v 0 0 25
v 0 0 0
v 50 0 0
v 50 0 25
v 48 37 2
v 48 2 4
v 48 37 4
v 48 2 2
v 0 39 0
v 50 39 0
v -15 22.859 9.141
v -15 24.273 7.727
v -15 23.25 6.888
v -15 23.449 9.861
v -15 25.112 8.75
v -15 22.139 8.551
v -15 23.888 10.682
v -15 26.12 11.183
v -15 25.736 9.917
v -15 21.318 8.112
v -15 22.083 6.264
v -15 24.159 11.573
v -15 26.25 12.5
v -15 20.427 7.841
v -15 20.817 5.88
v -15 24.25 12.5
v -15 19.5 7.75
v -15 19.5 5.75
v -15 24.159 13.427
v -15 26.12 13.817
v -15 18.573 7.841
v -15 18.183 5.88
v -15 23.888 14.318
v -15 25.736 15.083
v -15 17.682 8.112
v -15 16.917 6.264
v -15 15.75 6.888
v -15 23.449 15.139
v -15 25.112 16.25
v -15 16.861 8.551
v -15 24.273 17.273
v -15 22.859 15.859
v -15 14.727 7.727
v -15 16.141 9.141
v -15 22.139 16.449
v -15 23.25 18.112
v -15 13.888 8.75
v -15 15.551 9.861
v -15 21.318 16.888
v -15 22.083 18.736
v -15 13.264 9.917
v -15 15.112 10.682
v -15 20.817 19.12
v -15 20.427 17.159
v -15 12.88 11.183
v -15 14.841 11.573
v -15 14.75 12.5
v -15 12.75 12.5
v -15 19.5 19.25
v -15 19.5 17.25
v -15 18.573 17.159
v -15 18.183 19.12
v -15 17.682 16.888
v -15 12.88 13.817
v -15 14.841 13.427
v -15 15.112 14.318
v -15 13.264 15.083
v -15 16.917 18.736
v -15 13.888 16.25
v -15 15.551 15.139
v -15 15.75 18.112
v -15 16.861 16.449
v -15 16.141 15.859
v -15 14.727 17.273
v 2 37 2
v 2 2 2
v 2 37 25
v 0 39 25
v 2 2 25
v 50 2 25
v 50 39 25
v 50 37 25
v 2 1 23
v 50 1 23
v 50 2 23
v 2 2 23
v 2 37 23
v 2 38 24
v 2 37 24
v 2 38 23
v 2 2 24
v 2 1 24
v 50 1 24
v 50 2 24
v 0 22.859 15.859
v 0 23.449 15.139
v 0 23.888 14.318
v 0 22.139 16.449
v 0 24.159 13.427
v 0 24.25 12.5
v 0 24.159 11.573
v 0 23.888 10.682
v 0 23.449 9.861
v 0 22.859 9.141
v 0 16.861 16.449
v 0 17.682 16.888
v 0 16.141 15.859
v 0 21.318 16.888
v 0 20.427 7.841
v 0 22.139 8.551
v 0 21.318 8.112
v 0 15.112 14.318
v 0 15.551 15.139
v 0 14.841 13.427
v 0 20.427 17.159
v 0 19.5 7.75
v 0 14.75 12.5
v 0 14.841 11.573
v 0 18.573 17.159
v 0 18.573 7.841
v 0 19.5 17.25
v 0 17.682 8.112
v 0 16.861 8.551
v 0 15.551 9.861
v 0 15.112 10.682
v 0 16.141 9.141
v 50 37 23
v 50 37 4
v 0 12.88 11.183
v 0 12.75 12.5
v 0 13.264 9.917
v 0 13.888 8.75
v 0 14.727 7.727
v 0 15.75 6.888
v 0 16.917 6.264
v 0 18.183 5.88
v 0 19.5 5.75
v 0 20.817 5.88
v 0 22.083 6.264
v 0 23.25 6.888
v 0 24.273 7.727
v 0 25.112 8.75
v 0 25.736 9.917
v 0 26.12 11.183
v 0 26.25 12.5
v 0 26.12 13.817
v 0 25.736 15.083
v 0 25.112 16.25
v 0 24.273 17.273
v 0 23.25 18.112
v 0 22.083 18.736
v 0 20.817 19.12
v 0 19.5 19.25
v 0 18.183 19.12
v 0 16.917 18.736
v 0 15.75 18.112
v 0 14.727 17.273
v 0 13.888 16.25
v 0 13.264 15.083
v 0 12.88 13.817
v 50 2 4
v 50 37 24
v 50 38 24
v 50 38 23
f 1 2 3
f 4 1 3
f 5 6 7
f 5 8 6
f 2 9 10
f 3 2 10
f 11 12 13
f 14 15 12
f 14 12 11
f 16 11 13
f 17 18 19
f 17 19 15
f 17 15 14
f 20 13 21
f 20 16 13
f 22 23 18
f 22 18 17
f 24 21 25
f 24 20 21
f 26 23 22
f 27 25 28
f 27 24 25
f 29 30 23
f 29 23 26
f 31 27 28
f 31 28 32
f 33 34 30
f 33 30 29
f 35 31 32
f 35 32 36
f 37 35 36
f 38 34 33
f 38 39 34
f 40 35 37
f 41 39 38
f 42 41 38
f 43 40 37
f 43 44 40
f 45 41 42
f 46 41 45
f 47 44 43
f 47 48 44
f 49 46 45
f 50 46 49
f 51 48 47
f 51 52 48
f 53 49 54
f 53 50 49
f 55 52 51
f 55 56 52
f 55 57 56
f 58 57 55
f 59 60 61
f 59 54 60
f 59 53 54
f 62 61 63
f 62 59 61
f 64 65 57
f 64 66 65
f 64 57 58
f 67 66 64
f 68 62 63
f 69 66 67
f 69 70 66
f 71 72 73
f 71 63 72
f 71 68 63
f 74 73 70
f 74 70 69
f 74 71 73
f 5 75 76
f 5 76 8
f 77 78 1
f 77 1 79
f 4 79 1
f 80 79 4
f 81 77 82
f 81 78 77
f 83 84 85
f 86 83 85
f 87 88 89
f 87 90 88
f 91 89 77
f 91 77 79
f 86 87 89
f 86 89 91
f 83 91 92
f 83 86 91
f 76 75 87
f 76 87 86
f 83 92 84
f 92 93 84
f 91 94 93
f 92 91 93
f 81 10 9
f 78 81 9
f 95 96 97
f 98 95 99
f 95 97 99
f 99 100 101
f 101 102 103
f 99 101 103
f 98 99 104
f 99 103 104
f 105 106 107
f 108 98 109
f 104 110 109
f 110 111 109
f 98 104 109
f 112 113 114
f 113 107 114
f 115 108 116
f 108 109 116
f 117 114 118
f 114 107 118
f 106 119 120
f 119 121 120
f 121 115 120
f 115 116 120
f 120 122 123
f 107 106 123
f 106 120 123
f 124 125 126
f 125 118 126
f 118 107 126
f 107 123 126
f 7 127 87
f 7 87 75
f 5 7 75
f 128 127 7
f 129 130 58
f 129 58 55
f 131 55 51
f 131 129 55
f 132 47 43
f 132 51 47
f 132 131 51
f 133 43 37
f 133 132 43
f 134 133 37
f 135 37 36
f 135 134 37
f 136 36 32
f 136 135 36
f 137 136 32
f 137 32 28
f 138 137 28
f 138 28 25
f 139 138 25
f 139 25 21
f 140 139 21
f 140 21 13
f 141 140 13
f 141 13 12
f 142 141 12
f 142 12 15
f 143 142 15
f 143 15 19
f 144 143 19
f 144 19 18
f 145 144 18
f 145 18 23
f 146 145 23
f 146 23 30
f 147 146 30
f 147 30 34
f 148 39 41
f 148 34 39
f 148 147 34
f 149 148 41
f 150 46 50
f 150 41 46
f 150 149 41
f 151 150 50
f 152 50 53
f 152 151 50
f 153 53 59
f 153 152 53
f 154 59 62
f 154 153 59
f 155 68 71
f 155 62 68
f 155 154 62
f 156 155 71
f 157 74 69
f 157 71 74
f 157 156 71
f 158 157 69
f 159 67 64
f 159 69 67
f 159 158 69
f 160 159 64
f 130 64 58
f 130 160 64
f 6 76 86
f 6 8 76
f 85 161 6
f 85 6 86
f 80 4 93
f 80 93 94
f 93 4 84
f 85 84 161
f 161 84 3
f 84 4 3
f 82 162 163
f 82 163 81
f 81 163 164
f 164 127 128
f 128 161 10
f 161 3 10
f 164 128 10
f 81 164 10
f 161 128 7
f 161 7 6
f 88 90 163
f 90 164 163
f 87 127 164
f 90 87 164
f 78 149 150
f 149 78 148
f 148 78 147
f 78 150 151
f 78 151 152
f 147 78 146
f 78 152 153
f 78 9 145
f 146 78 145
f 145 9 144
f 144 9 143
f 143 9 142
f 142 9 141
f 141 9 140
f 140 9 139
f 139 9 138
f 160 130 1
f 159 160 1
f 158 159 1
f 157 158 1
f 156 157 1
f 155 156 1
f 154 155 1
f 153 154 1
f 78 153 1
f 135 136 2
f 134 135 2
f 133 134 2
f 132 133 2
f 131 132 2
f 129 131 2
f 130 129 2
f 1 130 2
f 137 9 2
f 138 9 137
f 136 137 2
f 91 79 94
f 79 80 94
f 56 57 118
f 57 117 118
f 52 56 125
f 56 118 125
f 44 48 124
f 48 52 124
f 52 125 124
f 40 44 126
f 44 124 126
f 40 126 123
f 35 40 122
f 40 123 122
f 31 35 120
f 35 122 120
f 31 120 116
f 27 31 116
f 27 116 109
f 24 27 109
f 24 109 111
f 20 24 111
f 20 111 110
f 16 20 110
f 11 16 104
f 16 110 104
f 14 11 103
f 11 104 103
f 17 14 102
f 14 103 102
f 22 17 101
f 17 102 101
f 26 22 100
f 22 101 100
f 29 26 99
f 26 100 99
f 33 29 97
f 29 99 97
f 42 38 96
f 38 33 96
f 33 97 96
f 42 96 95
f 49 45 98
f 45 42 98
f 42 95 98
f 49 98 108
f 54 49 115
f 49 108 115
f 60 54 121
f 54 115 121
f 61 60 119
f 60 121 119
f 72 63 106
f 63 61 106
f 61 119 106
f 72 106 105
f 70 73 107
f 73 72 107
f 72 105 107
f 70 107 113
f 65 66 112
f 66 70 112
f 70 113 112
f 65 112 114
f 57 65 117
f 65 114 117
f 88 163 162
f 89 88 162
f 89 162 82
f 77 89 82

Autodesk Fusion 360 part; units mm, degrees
sketch "Sketch1" plane through (0, 0, 0) normal (0, 0, 1) x (1, 0, 0)
  line L0 (0, 0) -> (50, 0)
  line L1 (50, 0) -> (50, 39)
  line L2 (50, 39) -> (0, 39)
  line L3 (0, 39) -> (0, 0)
  line L4 (2, 2) -> (48, 2)
  line L5 (48, 2) -> (48, 37)
  line L6 (48, 37) -> (2, 37)
  line L7 (2, 37) -> (2, 2)
  dimension "d1" = 46
  dimension "d2" = 2
  dimension "d3" = 2
  dimension "d4" = 2
  dimension "d5" = 2
  dimension "d6" = 35
extrude "Extrude1" add sketch "Sketch1" along normal blind 2 contours L4 L5 L6 L7
extrude "Extrude2" add sketch "Sketch1" along normal blind 25
sketch "Sketch2" plane through (50, 0, 0) normal (1, 0, 0) x (0, 1, 0)
  line L0 (0, 0) -> (39, 0)
  line L1 (39, 0) -> (39, 25)
  line L2 (39, 25) -> (0, 25)
  line L3 (0, 25) -> (0, 0)
  line L4 (2, 25) -> (2, 24)
  line L5 (2, 24) -> (1, 24)
  line L6 (1, 24) -> (1, 23)
  line L7 (1, 23) -> (38, 23)
  line L8 (38, 23) -> (38, 24)
  line L9 (38, 24) -> (37, 24)
  line L10 (37, 24) -> (37, 25)
  line L11 (2, 23) -> (37, 23)
  line L12 (37, 23) -> (37, 4)
  line L13 (37, 4) -> (2, 4)
  line L14 (2, 4) -> (2, 23)
  dimension "d11" = 1
  dimension "d12" = 1
  dimension "d13" = 1
  dimension "d14" = 1
  dimension "d15" = 1
  dimension "d16" = 1
  dimension "d17" = 1
  dimension "d18" = 19
extrude "Extrude3" cut sketch "Sketch2" against normal up to surface (48 mm away) contours L2 L4 L5 L6 L7 L8 L9 L10 L11 | L7 L11 L12 L13 L14
sketch "Sketch3" plane through (0, 0, 0) normal (-1, 0, 0) x (0, -1, 0)
  line L0 (-39, 0) -> (0, 0)
  line L1 (0, 0) -> (0, 25)
  line L2 (0, 25) -> (-39, 25)
  line L3 (-39, 25) -> (-39, 0)
  circle A0 centre (-19.5, 12.5) radius 6.75
  circle A1 centre (-19.5, 12.5) radius 4.75
  point P0 (-19.5, 25)
  point P1 (0, 12.5)
  dimension "d21" = 2
  dimension "d22" = 9.5
extrude "Extrude4" add sketch "Sketch3" along normal blind 15 contours A0
